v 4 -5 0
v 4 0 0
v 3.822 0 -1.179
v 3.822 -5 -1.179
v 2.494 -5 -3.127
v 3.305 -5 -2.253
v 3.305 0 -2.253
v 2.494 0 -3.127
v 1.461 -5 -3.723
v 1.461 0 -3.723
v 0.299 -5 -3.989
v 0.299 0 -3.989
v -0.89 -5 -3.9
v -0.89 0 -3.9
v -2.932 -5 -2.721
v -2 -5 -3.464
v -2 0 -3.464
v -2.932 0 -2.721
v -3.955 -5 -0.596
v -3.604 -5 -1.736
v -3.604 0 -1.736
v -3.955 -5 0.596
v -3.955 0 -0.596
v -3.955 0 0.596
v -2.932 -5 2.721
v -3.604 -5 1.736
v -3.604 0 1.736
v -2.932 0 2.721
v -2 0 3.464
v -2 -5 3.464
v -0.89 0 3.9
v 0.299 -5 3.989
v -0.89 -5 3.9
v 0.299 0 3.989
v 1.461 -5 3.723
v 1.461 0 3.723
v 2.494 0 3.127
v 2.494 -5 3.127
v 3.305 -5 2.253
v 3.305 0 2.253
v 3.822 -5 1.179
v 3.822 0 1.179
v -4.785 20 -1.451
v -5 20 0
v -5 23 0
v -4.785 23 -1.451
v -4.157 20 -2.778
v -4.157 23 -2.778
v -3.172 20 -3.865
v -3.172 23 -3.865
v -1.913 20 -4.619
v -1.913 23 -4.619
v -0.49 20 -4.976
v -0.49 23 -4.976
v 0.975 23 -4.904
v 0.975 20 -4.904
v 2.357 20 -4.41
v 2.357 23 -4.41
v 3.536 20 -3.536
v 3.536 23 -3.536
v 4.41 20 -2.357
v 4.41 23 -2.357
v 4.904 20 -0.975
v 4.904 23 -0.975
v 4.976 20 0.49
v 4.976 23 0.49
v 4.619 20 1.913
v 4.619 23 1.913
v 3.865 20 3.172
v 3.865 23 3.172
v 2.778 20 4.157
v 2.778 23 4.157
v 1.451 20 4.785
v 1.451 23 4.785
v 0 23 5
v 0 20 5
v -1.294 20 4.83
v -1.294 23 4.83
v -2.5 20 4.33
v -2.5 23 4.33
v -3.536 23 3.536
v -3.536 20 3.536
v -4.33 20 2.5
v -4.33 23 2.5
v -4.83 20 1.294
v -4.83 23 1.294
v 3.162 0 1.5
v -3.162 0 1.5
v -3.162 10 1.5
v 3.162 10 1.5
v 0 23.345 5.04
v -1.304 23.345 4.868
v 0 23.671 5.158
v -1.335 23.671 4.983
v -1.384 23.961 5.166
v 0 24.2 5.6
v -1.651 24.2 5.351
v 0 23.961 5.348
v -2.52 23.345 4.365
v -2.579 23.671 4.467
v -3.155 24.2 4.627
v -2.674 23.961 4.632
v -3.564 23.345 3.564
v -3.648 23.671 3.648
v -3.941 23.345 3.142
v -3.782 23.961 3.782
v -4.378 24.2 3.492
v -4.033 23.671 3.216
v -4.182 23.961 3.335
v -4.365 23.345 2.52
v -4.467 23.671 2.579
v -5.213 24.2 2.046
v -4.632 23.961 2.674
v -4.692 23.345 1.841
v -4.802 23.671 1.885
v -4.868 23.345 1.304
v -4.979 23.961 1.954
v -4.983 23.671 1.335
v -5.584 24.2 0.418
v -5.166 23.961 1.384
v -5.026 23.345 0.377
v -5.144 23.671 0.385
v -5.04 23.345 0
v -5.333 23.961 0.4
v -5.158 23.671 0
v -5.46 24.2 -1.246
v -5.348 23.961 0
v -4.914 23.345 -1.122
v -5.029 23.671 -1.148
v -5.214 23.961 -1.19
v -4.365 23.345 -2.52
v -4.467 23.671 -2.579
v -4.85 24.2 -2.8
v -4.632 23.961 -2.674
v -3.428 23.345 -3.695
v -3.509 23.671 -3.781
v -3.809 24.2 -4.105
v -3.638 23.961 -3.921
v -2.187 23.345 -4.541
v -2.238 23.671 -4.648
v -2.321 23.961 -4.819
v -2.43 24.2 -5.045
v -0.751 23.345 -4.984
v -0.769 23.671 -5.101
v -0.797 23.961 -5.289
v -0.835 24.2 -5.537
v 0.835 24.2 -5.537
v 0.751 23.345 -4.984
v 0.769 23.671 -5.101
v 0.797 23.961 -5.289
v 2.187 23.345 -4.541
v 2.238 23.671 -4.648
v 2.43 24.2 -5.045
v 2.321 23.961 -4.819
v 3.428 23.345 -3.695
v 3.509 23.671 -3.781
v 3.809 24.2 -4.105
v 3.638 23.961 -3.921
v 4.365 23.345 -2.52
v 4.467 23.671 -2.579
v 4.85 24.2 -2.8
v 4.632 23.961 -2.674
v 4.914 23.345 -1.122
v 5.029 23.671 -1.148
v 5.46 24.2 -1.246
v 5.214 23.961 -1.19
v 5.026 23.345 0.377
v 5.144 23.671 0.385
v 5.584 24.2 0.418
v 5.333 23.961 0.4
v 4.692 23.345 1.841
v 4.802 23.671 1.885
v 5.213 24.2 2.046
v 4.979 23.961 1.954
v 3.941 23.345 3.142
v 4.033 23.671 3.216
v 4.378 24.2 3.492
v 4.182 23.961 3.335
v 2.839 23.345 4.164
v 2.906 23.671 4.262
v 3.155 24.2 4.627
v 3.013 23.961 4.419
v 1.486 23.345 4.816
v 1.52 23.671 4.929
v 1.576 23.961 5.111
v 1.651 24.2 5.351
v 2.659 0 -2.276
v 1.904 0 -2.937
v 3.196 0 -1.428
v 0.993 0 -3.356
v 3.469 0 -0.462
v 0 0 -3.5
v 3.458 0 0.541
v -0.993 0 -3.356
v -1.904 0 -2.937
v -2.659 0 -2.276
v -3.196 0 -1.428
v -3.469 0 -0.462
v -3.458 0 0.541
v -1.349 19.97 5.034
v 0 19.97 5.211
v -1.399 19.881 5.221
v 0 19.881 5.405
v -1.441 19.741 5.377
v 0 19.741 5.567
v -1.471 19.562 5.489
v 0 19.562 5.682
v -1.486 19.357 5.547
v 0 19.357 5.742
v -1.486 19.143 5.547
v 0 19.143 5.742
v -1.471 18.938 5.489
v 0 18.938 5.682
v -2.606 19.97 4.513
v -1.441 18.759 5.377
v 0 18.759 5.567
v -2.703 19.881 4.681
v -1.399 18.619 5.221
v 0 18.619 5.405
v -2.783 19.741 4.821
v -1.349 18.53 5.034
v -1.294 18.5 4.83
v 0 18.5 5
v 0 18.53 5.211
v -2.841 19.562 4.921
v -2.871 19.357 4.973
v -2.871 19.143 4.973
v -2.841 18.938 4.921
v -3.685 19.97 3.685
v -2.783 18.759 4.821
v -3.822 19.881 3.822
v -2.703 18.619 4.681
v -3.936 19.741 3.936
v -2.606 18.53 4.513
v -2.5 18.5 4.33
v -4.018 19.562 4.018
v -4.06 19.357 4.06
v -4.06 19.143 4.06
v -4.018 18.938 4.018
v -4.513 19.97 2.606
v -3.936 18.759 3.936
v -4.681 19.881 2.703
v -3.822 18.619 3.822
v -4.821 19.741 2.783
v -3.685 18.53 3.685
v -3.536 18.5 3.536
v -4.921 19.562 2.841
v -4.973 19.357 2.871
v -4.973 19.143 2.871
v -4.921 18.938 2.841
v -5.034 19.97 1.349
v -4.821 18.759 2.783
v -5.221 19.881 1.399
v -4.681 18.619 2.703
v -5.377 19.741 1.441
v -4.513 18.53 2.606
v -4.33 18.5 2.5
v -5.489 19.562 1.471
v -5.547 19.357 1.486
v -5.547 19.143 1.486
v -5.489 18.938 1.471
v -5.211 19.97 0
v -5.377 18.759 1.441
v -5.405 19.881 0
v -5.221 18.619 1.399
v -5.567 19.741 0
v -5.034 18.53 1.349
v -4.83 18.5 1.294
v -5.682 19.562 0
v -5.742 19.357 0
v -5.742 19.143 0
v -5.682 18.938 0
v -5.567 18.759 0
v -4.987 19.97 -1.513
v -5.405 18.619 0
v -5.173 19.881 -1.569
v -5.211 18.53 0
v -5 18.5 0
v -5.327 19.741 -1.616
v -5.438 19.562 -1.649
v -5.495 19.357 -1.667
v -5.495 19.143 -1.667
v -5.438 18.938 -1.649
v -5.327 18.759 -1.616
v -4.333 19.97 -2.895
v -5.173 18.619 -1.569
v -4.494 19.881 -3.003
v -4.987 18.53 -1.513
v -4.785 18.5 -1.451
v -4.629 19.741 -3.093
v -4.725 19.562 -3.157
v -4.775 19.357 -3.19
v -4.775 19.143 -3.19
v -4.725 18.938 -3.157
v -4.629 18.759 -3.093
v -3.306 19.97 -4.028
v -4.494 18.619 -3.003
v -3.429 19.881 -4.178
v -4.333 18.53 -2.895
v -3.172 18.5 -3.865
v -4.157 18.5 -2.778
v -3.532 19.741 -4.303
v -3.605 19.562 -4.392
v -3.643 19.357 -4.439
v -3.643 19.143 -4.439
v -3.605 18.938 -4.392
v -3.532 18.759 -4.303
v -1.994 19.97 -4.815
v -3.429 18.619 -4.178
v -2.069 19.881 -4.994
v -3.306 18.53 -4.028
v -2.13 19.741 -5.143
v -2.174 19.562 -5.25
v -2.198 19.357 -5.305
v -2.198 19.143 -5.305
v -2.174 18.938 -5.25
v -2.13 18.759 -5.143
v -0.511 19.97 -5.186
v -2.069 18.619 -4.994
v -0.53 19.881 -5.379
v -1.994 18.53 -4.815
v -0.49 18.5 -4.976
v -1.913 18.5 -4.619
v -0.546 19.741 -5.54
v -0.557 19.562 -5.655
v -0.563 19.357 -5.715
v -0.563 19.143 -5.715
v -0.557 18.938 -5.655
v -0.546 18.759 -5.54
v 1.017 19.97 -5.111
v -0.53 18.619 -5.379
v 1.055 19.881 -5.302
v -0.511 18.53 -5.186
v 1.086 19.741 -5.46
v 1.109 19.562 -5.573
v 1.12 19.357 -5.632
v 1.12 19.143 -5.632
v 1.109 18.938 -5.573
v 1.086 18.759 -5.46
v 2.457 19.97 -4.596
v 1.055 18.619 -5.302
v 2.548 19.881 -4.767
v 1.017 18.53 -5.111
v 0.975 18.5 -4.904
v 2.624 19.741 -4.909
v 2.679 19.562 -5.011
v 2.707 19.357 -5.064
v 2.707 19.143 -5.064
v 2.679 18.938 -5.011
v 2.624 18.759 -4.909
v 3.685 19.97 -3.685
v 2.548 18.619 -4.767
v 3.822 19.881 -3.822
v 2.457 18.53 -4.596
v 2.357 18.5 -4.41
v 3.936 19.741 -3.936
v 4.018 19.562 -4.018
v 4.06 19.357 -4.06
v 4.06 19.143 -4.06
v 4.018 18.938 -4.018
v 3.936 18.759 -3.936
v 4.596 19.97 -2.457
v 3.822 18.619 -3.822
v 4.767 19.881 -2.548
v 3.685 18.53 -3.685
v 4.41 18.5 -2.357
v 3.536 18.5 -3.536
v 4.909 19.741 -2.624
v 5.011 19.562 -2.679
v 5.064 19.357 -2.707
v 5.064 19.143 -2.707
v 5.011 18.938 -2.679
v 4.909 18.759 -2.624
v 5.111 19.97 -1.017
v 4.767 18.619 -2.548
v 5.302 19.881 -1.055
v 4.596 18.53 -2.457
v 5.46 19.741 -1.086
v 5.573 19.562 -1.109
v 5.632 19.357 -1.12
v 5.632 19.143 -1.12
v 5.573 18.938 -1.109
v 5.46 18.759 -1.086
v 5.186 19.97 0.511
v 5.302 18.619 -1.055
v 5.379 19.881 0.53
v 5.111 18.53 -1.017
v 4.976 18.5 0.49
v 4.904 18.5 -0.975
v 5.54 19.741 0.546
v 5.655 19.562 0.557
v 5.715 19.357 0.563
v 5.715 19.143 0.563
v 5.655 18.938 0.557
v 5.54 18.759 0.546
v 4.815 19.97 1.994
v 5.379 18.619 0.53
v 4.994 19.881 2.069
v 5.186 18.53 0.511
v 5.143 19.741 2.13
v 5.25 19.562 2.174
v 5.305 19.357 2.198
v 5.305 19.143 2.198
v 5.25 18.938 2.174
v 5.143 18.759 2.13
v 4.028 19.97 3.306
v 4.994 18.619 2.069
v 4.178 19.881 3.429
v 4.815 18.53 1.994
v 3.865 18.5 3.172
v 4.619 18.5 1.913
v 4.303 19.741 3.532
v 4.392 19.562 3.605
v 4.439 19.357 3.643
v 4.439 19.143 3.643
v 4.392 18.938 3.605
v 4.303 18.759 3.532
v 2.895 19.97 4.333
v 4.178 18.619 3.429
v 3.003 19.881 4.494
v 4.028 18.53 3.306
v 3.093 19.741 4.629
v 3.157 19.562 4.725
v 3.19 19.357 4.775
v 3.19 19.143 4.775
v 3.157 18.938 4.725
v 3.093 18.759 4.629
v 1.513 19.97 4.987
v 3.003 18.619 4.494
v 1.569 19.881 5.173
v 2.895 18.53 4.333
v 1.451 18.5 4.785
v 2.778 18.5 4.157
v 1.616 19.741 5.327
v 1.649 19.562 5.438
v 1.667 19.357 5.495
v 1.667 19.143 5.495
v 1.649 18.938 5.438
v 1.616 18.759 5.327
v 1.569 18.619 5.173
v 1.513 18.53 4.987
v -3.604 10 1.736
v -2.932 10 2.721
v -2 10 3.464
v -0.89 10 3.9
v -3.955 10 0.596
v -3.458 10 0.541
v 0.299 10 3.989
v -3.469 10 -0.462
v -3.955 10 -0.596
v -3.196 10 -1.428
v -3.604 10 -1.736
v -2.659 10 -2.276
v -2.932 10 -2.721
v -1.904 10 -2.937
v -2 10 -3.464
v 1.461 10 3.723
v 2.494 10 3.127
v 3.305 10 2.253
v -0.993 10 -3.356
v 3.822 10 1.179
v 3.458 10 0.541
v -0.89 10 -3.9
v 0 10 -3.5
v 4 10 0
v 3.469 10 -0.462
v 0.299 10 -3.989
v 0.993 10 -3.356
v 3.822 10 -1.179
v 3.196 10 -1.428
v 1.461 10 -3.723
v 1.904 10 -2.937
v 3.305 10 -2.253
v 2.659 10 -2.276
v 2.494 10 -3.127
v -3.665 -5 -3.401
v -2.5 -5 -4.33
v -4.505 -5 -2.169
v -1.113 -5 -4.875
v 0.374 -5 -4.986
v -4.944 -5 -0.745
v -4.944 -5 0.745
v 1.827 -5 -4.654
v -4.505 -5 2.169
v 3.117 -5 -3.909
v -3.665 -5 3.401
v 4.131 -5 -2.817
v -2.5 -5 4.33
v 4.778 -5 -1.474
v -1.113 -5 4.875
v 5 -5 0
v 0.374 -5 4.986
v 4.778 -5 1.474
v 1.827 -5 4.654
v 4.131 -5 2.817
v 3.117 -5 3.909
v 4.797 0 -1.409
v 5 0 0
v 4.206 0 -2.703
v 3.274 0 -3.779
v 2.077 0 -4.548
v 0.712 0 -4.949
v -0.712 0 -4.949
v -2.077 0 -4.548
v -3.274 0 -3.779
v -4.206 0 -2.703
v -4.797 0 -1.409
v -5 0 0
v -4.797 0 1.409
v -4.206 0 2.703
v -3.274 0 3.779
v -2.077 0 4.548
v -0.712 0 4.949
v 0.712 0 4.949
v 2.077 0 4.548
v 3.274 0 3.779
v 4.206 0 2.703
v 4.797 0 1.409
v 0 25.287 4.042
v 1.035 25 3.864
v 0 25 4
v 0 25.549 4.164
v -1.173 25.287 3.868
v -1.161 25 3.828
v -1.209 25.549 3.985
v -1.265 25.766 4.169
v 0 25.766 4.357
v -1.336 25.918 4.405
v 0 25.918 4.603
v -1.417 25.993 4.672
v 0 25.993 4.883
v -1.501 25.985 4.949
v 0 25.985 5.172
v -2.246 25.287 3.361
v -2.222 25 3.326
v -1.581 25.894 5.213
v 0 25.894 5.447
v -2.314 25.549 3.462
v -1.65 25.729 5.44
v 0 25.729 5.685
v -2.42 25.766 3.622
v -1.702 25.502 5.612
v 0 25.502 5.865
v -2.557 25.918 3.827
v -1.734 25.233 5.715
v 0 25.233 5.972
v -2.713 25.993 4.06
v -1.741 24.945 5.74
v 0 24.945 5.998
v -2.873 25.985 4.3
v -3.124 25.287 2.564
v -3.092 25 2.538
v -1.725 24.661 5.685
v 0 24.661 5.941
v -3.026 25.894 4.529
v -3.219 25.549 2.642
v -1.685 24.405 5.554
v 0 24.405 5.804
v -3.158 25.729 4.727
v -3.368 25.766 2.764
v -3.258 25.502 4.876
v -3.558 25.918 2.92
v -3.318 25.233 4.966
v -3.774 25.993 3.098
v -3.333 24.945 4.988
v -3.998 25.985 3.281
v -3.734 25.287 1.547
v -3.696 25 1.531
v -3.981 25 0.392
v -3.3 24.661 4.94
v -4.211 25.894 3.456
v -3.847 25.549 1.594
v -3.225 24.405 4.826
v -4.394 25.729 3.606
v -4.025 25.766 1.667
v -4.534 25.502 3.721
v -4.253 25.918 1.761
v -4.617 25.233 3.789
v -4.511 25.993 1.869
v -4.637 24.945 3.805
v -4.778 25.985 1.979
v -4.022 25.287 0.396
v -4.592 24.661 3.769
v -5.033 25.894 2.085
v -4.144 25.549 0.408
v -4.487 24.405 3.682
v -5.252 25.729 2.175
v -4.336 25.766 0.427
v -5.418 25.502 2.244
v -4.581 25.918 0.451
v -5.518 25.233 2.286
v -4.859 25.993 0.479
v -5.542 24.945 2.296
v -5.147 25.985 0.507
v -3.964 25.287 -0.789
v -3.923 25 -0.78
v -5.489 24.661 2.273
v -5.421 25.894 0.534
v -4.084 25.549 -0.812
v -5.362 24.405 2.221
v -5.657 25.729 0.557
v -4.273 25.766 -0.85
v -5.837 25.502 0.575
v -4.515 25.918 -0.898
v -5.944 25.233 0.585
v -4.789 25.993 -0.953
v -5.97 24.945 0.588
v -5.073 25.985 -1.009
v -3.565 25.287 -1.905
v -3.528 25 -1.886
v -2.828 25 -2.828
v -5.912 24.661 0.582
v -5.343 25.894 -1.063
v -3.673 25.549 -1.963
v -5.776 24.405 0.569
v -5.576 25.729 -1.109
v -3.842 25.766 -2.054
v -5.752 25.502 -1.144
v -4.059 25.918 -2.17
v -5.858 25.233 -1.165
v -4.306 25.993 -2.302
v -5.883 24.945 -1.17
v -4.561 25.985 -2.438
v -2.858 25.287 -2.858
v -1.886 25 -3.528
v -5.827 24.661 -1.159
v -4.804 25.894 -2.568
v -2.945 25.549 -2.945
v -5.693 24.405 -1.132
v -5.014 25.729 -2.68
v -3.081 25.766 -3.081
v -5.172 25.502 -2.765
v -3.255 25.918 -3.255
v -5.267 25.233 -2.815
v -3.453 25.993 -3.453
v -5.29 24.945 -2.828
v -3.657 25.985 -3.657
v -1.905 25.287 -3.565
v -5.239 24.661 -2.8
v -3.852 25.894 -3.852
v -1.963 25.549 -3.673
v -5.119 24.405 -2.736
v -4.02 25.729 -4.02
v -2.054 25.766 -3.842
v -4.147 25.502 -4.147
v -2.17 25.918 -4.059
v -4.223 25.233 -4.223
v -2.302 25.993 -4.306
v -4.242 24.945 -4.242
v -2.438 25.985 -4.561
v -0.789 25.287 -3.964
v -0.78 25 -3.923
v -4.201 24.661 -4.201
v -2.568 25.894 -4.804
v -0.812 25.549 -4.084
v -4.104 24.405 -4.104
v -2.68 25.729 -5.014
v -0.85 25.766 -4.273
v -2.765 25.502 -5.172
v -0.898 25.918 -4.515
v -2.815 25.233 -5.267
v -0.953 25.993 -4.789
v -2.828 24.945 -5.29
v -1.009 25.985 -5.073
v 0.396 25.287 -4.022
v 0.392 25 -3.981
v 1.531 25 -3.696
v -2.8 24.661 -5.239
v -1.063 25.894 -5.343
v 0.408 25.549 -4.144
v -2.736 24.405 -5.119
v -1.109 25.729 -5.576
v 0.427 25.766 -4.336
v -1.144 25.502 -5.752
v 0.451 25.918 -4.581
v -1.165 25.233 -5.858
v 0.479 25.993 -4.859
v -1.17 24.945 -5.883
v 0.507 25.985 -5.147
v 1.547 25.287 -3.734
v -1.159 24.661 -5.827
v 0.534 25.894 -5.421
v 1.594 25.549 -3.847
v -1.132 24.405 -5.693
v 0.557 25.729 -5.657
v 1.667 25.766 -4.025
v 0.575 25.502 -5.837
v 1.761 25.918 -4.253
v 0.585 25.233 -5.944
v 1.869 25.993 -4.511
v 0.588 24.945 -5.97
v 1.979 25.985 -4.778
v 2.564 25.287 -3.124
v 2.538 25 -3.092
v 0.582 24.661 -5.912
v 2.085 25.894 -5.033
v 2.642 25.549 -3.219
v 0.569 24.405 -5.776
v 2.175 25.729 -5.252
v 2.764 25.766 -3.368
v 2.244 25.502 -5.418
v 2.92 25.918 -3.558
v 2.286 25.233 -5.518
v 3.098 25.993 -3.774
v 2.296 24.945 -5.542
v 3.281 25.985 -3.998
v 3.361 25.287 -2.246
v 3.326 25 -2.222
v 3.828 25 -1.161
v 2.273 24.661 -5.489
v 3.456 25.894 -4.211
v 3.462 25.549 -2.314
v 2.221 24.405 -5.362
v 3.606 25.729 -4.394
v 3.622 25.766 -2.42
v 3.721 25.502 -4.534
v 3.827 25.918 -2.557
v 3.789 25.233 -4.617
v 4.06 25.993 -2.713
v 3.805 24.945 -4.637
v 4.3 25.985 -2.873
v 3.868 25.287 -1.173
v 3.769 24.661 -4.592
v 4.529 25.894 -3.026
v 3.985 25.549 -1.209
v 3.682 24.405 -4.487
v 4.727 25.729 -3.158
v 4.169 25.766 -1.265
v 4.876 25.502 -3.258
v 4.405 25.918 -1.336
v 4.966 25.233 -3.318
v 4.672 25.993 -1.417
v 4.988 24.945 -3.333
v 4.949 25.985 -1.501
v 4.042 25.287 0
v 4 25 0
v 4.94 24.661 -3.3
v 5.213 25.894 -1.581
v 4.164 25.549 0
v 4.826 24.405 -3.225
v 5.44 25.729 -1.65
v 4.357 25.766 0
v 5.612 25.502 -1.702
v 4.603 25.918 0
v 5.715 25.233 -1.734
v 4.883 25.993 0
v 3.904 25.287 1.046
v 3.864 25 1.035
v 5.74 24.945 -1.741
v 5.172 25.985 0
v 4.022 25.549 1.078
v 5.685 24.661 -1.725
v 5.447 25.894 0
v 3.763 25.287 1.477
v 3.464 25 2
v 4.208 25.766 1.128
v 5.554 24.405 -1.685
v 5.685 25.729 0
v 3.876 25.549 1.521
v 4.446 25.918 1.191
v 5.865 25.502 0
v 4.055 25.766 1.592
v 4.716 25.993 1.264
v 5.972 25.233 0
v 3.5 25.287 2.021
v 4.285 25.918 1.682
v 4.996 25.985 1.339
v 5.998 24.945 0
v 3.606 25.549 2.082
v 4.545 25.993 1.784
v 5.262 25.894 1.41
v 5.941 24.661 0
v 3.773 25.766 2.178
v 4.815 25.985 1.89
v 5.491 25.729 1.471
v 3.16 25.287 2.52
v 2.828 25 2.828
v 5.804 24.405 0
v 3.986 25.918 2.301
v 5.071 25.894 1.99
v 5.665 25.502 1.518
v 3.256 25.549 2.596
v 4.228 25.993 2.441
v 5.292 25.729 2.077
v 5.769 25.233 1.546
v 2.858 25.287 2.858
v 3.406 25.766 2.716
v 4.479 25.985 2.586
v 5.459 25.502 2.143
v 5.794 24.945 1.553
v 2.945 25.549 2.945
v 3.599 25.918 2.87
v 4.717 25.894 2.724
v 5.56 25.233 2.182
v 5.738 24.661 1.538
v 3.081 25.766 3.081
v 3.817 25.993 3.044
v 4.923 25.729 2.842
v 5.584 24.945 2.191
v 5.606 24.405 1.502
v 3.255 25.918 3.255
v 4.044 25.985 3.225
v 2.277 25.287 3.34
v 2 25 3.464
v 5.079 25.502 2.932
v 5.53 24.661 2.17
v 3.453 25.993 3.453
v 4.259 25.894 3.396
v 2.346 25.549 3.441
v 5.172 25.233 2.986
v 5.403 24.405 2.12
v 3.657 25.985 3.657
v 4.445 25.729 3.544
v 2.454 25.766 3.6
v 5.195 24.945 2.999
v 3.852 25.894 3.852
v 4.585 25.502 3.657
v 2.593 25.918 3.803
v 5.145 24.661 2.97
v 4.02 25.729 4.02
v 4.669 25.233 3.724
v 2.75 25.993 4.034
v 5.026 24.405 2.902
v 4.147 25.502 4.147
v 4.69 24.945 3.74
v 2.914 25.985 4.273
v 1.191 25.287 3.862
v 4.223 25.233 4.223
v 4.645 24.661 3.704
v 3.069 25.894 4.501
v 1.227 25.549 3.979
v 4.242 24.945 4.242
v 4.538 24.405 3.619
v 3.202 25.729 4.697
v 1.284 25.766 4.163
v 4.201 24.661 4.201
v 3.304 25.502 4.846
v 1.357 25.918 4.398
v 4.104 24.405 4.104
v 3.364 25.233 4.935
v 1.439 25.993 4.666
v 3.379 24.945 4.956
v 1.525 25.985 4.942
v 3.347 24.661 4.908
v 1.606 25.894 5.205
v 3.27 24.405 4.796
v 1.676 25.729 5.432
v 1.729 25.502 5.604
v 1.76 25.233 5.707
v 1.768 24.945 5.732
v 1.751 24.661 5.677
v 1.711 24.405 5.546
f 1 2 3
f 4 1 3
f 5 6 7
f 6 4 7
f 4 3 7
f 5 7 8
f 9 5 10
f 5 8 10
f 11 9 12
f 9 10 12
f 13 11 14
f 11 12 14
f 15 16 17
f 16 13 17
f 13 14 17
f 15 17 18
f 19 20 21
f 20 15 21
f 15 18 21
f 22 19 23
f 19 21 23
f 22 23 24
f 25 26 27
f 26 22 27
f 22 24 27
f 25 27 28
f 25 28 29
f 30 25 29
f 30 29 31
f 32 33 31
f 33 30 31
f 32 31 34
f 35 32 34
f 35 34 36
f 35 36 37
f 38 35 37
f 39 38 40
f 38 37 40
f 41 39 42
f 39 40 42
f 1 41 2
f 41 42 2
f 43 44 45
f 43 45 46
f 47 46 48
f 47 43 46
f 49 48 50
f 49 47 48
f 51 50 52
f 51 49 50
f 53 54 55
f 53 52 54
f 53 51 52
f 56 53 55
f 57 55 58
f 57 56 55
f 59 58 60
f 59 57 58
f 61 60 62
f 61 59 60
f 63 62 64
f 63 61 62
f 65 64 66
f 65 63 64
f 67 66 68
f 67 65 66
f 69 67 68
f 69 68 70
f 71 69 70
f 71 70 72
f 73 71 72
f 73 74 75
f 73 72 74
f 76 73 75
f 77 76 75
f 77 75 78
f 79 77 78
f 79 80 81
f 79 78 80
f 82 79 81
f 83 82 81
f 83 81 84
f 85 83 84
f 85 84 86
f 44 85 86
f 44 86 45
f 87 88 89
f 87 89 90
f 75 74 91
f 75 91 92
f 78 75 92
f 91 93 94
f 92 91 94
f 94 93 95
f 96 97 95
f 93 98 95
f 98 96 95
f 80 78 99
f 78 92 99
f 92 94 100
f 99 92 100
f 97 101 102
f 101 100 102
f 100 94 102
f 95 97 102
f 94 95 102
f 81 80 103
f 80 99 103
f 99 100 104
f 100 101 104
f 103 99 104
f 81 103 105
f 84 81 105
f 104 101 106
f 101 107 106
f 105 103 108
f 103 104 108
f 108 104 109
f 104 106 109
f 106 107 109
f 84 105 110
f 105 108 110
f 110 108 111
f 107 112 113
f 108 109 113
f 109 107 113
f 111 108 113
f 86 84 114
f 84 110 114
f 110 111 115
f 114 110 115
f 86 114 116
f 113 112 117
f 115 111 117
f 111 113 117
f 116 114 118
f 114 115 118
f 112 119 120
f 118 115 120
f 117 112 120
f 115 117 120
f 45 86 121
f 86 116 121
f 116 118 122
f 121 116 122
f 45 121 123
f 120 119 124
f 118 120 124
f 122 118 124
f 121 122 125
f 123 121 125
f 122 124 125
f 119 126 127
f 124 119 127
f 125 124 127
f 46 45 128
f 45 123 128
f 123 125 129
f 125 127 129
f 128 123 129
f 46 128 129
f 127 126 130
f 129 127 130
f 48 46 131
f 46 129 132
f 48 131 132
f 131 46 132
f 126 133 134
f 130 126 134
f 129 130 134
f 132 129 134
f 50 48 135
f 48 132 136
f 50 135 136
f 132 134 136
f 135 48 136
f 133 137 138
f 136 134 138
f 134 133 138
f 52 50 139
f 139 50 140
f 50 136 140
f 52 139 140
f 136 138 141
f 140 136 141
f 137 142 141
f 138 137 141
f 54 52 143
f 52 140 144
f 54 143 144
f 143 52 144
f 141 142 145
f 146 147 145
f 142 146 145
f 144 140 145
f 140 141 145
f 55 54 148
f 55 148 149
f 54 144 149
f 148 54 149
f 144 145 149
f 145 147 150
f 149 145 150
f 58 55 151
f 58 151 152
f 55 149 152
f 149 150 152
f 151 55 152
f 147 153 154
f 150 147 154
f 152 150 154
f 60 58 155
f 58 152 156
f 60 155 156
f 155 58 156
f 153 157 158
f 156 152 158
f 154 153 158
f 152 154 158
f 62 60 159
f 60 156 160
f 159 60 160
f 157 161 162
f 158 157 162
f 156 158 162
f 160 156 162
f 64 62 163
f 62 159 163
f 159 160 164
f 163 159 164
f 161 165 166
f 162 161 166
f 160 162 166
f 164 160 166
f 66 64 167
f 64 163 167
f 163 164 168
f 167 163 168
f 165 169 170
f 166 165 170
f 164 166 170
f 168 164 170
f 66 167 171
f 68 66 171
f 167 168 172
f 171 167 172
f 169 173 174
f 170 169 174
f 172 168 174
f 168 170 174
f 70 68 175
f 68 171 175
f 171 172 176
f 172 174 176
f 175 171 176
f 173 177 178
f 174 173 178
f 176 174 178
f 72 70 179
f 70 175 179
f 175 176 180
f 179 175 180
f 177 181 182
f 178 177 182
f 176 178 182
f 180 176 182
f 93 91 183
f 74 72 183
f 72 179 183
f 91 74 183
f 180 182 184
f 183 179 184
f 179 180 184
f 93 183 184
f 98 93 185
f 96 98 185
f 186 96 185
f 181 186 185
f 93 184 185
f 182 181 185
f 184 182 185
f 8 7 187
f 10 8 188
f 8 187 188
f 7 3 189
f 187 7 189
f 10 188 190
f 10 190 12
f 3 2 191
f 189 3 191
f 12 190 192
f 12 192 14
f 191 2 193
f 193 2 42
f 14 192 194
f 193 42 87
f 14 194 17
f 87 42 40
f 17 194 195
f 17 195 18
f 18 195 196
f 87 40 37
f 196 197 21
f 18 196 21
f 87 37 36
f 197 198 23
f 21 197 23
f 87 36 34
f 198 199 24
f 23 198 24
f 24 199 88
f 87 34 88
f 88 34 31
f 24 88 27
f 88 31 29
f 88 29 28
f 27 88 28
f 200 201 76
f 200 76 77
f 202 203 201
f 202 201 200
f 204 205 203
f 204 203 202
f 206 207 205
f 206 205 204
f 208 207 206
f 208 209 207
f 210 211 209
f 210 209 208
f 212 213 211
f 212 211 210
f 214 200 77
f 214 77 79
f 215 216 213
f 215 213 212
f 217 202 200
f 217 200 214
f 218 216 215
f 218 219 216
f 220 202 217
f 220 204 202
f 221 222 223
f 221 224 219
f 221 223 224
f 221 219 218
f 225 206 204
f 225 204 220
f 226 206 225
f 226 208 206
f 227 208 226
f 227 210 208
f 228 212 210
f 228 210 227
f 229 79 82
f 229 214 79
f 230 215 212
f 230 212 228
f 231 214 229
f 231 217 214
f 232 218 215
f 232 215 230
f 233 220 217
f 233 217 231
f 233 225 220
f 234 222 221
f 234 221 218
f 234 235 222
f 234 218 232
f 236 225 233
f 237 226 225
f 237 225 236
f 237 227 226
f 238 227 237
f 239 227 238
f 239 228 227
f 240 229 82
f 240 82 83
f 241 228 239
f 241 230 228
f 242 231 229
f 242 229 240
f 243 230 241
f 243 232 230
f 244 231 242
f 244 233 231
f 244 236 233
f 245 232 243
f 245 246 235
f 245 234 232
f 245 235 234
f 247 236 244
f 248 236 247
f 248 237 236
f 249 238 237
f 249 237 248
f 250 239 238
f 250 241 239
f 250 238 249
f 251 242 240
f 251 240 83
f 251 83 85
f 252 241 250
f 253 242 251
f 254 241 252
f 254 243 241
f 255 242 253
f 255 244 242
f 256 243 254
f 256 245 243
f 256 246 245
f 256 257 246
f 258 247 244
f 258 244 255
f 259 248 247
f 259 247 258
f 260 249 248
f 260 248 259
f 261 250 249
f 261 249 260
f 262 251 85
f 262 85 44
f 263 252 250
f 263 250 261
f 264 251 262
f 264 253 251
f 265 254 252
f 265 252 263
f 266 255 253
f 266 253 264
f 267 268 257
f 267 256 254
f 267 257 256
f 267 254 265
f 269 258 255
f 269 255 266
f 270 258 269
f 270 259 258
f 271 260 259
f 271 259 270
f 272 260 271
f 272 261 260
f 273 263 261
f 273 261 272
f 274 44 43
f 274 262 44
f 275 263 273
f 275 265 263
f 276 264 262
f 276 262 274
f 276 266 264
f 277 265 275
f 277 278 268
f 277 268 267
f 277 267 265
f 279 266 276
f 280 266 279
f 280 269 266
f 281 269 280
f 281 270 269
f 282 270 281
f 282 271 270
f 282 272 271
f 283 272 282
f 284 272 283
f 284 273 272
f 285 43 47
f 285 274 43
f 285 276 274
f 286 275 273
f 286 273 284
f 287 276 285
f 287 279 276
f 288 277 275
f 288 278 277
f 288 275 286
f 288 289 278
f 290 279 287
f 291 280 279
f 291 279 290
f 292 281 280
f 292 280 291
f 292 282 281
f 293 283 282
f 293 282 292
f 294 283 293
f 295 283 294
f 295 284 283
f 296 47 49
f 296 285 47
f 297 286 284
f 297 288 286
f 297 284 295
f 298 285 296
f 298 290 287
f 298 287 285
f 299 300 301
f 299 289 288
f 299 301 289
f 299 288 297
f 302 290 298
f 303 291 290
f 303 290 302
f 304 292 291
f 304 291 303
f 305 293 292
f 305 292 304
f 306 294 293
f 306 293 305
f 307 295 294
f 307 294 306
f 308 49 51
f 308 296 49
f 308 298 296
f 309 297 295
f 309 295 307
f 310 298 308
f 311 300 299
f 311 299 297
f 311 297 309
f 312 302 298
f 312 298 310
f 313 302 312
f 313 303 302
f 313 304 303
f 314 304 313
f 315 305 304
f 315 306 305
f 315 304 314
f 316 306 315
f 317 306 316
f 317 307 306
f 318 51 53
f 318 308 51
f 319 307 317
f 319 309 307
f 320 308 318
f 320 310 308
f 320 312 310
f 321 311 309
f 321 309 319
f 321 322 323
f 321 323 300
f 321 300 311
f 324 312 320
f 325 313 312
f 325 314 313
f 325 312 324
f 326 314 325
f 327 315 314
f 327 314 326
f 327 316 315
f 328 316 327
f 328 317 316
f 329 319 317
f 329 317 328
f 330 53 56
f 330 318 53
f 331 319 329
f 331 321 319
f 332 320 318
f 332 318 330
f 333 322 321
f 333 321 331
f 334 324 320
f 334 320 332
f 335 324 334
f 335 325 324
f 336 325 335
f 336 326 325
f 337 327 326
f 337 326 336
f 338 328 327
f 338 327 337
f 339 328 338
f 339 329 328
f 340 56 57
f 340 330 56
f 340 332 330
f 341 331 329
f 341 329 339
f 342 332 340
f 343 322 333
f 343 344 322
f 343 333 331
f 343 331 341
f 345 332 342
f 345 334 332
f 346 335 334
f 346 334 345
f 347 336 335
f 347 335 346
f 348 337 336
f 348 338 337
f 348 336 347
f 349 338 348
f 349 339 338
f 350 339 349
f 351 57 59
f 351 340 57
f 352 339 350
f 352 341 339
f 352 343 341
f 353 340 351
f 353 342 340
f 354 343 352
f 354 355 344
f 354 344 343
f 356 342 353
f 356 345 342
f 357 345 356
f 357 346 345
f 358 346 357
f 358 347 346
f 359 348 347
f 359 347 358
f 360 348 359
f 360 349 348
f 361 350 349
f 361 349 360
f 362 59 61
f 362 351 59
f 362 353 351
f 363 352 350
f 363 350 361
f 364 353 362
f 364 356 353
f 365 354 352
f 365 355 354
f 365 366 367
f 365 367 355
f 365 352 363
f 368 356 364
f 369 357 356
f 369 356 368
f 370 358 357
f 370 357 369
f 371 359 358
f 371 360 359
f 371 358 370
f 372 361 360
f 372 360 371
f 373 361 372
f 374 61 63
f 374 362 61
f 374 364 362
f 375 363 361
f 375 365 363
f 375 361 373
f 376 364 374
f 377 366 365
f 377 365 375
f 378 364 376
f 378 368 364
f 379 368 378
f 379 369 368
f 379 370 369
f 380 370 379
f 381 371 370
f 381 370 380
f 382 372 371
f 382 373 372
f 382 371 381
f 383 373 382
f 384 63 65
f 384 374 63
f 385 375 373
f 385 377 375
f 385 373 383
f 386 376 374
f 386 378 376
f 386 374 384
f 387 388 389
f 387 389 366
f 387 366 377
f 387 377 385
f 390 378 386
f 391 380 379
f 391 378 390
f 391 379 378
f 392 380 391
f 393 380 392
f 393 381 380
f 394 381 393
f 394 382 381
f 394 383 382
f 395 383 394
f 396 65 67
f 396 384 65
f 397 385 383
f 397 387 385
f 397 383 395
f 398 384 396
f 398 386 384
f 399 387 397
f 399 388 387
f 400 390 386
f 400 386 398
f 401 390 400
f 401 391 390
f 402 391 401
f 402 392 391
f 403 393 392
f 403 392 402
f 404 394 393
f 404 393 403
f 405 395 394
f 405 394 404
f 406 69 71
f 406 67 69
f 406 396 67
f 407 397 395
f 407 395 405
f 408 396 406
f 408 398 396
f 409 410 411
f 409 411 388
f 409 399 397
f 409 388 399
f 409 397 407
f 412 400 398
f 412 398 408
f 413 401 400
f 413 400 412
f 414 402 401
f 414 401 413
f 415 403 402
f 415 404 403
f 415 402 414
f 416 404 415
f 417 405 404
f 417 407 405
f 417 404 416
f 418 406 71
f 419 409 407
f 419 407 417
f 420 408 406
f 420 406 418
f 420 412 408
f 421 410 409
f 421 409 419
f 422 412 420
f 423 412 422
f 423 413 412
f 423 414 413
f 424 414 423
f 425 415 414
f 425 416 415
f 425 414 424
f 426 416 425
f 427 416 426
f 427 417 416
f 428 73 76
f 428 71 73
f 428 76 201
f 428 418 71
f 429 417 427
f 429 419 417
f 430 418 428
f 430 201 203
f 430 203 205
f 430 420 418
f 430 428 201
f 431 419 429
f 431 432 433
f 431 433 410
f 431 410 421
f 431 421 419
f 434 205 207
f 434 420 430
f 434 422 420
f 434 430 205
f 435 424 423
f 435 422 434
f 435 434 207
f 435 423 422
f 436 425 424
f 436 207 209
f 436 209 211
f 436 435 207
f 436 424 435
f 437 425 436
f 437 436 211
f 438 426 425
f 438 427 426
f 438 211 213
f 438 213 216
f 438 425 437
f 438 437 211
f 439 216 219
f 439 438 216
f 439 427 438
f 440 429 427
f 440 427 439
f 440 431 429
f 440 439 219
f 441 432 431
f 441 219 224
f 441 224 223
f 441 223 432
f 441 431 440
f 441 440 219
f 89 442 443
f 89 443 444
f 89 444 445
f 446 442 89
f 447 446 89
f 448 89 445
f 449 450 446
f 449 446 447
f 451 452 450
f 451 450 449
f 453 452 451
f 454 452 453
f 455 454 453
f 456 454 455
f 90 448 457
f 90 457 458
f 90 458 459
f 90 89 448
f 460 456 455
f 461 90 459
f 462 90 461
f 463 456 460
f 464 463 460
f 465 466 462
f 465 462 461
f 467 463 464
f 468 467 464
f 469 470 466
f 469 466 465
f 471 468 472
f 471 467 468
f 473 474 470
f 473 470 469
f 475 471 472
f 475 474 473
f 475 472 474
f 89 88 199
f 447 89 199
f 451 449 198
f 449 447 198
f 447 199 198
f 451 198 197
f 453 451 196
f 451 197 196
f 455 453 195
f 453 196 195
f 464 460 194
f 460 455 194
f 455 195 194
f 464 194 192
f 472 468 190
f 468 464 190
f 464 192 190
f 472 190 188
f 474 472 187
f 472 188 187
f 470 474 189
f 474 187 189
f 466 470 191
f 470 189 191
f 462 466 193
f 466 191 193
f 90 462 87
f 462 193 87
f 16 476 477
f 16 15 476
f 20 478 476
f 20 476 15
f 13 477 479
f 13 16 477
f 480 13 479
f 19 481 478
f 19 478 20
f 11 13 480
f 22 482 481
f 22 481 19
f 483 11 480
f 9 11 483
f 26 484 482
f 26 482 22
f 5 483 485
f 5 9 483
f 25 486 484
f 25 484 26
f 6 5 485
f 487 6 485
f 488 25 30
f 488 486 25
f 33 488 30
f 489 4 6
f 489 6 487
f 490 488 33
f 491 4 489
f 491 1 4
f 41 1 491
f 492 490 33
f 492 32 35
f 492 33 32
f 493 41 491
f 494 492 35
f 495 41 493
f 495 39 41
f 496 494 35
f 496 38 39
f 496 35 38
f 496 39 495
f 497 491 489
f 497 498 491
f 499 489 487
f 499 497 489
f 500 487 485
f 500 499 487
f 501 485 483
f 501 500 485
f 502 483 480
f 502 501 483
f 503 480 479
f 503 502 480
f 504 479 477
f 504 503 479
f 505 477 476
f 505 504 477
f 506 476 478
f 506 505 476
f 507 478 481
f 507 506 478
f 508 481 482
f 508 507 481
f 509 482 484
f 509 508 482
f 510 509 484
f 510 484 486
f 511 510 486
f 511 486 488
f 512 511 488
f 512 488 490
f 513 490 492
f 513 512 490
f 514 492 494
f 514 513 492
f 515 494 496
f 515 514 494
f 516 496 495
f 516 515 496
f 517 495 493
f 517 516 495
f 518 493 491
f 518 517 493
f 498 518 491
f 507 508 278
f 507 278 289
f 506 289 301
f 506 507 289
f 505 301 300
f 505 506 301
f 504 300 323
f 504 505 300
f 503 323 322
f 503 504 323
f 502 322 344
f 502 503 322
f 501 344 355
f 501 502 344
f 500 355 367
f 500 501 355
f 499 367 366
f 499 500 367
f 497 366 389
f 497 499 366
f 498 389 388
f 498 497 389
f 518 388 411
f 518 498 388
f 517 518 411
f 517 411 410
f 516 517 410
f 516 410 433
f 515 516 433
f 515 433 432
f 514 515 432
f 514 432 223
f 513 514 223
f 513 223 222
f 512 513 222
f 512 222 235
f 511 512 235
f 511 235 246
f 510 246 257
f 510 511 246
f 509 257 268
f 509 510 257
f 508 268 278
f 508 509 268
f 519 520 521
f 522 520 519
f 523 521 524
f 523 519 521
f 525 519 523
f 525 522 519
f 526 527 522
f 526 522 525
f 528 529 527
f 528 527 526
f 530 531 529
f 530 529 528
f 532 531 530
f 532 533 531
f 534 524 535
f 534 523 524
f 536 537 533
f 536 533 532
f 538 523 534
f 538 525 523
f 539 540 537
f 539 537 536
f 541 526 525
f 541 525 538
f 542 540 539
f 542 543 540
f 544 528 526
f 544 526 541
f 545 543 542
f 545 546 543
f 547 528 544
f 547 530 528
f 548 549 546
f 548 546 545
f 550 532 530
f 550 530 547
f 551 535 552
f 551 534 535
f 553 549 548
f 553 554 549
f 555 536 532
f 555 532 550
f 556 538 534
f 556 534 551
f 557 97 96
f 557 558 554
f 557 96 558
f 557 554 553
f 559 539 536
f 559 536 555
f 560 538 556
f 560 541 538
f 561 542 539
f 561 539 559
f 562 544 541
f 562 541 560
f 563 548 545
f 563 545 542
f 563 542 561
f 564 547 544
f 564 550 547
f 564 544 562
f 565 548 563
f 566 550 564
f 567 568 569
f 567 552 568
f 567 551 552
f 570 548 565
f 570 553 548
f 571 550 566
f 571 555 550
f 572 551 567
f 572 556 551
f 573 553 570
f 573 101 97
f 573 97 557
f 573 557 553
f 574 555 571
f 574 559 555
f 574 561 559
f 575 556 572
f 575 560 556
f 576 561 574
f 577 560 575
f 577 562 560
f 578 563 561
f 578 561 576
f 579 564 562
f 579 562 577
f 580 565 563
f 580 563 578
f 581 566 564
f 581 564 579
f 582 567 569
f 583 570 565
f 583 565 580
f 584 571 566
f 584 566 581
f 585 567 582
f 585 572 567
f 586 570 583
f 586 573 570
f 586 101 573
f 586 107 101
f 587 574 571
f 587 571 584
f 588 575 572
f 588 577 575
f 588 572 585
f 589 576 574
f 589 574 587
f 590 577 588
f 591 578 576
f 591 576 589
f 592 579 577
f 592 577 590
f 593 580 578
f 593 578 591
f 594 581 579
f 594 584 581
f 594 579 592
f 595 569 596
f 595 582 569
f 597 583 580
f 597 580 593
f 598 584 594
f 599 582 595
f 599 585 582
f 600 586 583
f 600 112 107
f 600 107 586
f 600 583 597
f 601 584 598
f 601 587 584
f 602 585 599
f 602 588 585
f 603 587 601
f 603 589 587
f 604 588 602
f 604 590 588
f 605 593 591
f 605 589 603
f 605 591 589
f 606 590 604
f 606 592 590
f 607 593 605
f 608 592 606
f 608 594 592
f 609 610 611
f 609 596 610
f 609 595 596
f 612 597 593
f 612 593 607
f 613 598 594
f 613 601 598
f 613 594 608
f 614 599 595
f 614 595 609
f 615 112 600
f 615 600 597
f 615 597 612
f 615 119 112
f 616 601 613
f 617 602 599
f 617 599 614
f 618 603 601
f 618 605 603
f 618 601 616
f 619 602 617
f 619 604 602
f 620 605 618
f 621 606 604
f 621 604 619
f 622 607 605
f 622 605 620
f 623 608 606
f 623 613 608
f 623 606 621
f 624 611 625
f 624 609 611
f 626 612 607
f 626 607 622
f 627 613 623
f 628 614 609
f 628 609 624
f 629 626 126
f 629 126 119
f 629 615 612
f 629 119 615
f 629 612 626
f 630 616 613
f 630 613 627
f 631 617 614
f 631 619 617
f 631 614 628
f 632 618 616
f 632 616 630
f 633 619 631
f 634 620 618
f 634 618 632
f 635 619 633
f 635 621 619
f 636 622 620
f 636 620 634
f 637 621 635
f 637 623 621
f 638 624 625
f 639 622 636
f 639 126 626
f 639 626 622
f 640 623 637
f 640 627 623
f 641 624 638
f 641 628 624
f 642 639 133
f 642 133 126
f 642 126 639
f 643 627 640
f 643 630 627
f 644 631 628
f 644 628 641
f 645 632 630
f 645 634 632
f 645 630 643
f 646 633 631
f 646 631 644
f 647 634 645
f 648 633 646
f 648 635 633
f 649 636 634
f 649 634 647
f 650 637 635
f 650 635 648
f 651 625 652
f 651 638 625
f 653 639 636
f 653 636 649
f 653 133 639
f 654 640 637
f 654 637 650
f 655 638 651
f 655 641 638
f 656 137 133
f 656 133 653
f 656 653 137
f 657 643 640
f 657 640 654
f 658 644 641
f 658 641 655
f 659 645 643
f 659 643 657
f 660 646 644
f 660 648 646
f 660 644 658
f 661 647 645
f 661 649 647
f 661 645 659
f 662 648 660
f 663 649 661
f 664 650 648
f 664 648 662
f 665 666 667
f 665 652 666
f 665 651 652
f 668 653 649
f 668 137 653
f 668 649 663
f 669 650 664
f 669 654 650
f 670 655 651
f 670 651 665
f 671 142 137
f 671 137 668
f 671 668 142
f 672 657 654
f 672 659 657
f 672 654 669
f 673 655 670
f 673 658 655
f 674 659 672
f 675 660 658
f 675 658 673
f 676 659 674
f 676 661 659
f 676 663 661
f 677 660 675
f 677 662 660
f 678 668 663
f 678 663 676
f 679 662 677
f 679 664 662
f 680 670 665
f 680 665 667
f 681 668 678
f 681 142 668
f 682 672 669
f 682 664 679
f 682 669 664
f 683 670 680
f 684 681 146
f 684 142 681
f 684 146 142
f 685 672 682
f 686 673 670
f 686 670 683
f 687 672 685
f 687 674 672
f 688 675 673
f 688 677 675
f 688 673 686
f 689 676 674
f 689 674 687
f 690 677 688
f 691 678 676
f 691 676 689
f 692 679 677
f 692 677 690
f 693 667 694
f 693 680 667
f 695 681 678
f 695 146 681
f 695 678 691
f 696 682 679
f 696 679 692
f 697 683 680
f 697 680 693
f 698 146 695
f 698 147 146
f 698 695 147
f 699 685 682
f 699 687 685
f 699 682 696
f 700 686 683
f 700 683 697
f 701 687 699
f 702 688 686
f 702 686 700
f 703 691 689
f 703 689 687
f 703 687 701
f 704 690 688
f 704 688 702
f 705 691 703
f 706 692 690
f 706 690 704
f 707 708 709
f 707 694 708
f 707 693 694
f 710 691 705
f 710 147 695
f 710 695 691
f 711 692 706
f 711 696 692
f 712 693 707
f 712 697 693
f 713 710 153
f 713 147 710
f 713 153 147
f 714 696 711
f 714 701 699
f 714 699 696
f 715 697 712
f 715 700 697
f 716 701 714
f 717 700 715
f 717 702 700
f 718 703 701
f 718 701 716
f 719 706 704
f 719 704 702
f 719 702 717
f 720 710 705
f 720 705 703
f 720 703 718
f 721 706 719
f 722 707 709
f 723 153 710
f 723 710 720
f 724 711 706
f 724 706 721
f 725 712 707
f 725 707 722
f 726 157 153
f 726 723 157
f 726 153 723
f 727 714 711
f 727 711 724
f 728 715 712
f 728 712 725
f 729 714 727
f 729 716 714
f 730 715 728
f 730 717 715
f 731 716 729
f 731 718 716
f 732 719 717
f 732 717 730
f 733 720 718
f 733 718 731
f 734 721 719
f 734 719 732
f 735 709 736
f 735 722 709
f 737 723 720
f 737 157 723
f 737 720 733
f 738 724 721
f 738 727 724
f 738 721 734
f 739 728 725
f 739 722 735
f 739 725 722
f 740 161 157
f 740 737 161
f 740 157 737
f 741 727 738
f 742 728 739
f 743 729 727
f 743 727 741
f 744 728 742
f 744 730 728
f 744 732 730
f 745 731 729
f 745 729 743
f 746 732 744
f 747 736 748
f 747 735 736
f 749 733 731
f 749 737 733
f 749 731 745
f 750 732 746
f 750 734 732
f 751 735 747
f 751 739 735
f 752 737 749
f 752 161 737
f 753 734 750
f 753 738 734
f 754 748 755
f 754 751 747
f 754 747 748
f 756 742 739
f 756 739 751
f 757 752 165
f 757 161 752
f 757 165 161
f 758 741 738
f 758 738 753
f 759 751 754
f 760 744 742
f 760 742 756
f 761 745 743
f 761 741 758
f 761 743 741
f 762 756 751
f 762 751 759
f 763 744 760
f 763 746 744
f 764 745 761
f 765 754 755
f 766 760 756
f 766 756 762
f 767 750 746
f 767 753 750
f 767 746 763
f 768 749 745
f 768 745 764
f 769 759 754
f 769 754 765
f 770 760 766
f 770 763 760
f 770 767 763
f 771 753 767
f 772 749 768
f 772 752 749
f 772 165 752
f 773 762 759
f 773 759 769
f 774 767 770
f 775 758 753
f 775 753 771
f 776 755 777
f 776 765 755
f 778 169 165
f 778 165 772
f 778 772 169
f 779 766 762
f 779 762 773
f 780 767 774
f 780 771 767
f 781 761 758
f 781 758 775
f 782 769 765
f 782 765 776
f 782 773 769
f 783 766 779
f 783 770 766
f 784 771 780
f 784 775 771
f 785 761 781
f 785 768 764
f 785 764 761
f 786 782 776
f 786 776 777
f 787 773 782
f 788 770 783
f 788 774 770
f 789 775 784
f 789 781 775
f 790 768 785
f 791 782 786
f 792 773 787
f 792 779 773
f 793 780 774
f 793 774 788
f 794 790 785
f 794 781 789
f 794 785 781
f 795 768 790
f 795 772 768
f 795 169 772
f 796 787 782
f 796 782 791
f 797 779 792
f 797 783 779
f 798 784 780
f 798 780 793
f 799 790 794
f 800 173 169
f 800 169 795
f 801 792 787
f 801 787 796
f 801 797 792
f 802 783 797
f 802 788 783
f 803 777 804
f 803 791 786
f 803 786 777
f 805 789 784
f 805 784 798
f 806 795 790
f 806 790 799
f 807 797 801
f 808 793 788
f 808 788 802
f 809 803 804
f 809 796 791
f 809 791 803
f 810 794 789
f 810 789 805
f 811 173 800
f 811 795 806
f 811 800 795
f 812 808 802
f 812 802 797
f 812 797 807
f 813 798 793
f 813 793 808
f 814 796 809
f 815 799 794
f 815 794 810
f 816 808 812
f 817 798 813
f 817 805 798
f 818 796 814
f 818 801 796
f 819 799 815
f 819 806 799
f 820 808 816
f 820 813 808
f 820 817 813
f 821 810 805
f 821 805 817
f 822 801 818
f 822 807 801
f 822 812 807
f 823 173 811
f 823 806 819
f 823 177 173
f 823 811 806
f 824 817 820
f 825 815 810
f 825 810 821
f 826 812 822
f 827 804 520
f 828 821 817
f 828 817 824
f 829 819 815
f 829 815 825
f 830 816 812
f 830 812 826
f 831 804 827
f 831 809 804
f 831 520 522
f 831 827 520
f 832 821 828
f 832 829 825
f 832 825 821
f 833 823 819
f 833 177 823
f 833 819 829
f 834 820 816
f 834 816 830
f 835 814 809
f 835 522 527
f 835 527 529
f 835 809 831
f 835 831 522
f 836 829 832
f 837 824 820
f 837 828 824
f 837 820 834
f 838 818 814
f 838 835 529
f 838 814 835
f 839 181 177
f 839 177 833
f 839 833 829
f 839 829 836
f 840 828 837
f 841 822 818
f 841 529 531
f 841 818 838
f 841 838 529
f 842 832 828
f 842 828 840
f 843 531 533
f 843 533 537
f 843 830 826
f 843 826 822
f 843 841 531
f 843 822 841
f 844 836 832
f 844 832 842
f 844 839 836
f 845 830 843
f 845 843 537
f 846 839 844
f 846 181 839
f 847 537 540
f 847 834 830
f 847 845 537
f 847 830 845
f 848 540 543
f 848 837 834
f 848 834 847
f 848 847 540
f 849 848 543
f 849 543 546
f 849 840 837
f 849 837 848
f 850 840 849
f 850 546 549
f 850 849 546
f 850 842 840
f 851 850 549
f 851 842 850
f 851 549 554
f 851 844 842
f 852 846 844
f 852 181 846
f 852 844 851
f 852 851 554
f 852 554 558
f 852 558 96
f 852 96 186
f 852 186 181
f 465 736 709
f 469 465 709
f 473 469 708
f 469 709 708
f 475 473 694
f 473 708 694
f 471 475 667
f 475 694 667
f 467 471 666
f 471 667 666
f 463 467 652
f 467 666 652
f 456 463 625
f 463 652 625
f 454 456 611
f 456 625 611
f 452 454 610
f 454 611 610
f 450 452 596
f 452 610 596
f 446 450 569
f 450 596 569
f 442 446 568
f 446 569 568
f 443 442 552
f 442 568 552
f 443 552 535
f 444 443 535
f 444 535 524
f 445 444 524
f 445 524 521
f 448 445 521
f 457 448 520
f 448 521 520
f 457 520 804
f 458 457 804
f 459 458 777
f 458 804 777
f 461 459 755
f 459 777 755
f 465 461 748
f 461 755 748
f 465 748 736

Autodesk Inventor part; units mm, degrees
ref_plane "YZ Plane" through (0, 0, 0) normal (1, 0, 0) x (0, 1, 0)
ref_plane "XZ Plane" through (0, 0, 0) normal (0, 1, 0) x (-1, 0, 0)
ref_plane "XY Plane" through (0, 0, 0) normal (0, 0, 1) x (1, 0, 0)
sketch "Skizze1" plane through (0, 0, 0) normal (0, 1, 0) x (-1, 0, 0)
  circle A0 centre (0, 0) radius 5
  dimension "d0" = 10
extrude "Extrusion1" add sketch "Skizze1" along normal blind 25
sketch "Skizze2" plane through (0, 0, 0) normal (0, -1, 0) x (1, 0, 0)
  circle A0 centre (0, 0) radius 5 projected
  circle A1 centre (0, 0) radius 3.5
  line L0 (-3.1623, 1.5) -> (3.1623, 1.5)
  dimension "d3" = 7
  dimension "d4" = 5
extrude "Extrusion2" cut sketch "Skizze2" against normal blind 10 contours A1 L0 picked at (-0.8784, -0.2211)
sketch "Skizze3" plane through (0, 0, 0) normal (0, -1, 0) x (1, 0, 0)
  circle A0 centre (0, 0) radius 5 projected
  circle A1 centre (0, 0) radius 4
  dimension "d7" = 1
extrude "Extrusion3" add sketch "Skizze3" along normal blind 5
sketch "Skizze4" plane through (0, 0, 0) normal (1, 0, 0) x (0, 1, 0)
  line L0 (-5, 5) -> (-5, -5) projected
  line L1 (25, -5) -> (25, 5) projected
  line L2 (-5, 5) -> (25, 5) projected
  arc A0 (20, 5) -> (18.5, 5) centre (19.25, 5) ccw
  arc A1 (23, 5) -> (24.2, 5.6) centre (23, 6.5) ccw
  arc A2 (25, 4) -> (24.2, 5.6) centre (25, 5) ccw
  line L3 (-10.2683, 0) -> (26.61, 0) projected
  point P0 (0, 0)
  dimension "d10" = 5
  dimension "d11" = 0.75
  dimension "d12" = 2
  dimension "d13" = 1
  dimension "d14" = 1
revolve "Umdrehung1" add sketch "Skizze4" angle 360 about axis through (0, -10, 0) along (0, 1, 0) contours A0 L2 | L1 L2 A1 A2
sketch "Skizze5" plane through (0, 25, 0) normal (0, 1, 0) x (1, 0, 0)
  circle A0 centre (0, 0) radius 4 projected
extrude "Extrusion4" cut sketch "Skizze5" against normal up to surface (15 mm away)
properties part number "chimmney"
